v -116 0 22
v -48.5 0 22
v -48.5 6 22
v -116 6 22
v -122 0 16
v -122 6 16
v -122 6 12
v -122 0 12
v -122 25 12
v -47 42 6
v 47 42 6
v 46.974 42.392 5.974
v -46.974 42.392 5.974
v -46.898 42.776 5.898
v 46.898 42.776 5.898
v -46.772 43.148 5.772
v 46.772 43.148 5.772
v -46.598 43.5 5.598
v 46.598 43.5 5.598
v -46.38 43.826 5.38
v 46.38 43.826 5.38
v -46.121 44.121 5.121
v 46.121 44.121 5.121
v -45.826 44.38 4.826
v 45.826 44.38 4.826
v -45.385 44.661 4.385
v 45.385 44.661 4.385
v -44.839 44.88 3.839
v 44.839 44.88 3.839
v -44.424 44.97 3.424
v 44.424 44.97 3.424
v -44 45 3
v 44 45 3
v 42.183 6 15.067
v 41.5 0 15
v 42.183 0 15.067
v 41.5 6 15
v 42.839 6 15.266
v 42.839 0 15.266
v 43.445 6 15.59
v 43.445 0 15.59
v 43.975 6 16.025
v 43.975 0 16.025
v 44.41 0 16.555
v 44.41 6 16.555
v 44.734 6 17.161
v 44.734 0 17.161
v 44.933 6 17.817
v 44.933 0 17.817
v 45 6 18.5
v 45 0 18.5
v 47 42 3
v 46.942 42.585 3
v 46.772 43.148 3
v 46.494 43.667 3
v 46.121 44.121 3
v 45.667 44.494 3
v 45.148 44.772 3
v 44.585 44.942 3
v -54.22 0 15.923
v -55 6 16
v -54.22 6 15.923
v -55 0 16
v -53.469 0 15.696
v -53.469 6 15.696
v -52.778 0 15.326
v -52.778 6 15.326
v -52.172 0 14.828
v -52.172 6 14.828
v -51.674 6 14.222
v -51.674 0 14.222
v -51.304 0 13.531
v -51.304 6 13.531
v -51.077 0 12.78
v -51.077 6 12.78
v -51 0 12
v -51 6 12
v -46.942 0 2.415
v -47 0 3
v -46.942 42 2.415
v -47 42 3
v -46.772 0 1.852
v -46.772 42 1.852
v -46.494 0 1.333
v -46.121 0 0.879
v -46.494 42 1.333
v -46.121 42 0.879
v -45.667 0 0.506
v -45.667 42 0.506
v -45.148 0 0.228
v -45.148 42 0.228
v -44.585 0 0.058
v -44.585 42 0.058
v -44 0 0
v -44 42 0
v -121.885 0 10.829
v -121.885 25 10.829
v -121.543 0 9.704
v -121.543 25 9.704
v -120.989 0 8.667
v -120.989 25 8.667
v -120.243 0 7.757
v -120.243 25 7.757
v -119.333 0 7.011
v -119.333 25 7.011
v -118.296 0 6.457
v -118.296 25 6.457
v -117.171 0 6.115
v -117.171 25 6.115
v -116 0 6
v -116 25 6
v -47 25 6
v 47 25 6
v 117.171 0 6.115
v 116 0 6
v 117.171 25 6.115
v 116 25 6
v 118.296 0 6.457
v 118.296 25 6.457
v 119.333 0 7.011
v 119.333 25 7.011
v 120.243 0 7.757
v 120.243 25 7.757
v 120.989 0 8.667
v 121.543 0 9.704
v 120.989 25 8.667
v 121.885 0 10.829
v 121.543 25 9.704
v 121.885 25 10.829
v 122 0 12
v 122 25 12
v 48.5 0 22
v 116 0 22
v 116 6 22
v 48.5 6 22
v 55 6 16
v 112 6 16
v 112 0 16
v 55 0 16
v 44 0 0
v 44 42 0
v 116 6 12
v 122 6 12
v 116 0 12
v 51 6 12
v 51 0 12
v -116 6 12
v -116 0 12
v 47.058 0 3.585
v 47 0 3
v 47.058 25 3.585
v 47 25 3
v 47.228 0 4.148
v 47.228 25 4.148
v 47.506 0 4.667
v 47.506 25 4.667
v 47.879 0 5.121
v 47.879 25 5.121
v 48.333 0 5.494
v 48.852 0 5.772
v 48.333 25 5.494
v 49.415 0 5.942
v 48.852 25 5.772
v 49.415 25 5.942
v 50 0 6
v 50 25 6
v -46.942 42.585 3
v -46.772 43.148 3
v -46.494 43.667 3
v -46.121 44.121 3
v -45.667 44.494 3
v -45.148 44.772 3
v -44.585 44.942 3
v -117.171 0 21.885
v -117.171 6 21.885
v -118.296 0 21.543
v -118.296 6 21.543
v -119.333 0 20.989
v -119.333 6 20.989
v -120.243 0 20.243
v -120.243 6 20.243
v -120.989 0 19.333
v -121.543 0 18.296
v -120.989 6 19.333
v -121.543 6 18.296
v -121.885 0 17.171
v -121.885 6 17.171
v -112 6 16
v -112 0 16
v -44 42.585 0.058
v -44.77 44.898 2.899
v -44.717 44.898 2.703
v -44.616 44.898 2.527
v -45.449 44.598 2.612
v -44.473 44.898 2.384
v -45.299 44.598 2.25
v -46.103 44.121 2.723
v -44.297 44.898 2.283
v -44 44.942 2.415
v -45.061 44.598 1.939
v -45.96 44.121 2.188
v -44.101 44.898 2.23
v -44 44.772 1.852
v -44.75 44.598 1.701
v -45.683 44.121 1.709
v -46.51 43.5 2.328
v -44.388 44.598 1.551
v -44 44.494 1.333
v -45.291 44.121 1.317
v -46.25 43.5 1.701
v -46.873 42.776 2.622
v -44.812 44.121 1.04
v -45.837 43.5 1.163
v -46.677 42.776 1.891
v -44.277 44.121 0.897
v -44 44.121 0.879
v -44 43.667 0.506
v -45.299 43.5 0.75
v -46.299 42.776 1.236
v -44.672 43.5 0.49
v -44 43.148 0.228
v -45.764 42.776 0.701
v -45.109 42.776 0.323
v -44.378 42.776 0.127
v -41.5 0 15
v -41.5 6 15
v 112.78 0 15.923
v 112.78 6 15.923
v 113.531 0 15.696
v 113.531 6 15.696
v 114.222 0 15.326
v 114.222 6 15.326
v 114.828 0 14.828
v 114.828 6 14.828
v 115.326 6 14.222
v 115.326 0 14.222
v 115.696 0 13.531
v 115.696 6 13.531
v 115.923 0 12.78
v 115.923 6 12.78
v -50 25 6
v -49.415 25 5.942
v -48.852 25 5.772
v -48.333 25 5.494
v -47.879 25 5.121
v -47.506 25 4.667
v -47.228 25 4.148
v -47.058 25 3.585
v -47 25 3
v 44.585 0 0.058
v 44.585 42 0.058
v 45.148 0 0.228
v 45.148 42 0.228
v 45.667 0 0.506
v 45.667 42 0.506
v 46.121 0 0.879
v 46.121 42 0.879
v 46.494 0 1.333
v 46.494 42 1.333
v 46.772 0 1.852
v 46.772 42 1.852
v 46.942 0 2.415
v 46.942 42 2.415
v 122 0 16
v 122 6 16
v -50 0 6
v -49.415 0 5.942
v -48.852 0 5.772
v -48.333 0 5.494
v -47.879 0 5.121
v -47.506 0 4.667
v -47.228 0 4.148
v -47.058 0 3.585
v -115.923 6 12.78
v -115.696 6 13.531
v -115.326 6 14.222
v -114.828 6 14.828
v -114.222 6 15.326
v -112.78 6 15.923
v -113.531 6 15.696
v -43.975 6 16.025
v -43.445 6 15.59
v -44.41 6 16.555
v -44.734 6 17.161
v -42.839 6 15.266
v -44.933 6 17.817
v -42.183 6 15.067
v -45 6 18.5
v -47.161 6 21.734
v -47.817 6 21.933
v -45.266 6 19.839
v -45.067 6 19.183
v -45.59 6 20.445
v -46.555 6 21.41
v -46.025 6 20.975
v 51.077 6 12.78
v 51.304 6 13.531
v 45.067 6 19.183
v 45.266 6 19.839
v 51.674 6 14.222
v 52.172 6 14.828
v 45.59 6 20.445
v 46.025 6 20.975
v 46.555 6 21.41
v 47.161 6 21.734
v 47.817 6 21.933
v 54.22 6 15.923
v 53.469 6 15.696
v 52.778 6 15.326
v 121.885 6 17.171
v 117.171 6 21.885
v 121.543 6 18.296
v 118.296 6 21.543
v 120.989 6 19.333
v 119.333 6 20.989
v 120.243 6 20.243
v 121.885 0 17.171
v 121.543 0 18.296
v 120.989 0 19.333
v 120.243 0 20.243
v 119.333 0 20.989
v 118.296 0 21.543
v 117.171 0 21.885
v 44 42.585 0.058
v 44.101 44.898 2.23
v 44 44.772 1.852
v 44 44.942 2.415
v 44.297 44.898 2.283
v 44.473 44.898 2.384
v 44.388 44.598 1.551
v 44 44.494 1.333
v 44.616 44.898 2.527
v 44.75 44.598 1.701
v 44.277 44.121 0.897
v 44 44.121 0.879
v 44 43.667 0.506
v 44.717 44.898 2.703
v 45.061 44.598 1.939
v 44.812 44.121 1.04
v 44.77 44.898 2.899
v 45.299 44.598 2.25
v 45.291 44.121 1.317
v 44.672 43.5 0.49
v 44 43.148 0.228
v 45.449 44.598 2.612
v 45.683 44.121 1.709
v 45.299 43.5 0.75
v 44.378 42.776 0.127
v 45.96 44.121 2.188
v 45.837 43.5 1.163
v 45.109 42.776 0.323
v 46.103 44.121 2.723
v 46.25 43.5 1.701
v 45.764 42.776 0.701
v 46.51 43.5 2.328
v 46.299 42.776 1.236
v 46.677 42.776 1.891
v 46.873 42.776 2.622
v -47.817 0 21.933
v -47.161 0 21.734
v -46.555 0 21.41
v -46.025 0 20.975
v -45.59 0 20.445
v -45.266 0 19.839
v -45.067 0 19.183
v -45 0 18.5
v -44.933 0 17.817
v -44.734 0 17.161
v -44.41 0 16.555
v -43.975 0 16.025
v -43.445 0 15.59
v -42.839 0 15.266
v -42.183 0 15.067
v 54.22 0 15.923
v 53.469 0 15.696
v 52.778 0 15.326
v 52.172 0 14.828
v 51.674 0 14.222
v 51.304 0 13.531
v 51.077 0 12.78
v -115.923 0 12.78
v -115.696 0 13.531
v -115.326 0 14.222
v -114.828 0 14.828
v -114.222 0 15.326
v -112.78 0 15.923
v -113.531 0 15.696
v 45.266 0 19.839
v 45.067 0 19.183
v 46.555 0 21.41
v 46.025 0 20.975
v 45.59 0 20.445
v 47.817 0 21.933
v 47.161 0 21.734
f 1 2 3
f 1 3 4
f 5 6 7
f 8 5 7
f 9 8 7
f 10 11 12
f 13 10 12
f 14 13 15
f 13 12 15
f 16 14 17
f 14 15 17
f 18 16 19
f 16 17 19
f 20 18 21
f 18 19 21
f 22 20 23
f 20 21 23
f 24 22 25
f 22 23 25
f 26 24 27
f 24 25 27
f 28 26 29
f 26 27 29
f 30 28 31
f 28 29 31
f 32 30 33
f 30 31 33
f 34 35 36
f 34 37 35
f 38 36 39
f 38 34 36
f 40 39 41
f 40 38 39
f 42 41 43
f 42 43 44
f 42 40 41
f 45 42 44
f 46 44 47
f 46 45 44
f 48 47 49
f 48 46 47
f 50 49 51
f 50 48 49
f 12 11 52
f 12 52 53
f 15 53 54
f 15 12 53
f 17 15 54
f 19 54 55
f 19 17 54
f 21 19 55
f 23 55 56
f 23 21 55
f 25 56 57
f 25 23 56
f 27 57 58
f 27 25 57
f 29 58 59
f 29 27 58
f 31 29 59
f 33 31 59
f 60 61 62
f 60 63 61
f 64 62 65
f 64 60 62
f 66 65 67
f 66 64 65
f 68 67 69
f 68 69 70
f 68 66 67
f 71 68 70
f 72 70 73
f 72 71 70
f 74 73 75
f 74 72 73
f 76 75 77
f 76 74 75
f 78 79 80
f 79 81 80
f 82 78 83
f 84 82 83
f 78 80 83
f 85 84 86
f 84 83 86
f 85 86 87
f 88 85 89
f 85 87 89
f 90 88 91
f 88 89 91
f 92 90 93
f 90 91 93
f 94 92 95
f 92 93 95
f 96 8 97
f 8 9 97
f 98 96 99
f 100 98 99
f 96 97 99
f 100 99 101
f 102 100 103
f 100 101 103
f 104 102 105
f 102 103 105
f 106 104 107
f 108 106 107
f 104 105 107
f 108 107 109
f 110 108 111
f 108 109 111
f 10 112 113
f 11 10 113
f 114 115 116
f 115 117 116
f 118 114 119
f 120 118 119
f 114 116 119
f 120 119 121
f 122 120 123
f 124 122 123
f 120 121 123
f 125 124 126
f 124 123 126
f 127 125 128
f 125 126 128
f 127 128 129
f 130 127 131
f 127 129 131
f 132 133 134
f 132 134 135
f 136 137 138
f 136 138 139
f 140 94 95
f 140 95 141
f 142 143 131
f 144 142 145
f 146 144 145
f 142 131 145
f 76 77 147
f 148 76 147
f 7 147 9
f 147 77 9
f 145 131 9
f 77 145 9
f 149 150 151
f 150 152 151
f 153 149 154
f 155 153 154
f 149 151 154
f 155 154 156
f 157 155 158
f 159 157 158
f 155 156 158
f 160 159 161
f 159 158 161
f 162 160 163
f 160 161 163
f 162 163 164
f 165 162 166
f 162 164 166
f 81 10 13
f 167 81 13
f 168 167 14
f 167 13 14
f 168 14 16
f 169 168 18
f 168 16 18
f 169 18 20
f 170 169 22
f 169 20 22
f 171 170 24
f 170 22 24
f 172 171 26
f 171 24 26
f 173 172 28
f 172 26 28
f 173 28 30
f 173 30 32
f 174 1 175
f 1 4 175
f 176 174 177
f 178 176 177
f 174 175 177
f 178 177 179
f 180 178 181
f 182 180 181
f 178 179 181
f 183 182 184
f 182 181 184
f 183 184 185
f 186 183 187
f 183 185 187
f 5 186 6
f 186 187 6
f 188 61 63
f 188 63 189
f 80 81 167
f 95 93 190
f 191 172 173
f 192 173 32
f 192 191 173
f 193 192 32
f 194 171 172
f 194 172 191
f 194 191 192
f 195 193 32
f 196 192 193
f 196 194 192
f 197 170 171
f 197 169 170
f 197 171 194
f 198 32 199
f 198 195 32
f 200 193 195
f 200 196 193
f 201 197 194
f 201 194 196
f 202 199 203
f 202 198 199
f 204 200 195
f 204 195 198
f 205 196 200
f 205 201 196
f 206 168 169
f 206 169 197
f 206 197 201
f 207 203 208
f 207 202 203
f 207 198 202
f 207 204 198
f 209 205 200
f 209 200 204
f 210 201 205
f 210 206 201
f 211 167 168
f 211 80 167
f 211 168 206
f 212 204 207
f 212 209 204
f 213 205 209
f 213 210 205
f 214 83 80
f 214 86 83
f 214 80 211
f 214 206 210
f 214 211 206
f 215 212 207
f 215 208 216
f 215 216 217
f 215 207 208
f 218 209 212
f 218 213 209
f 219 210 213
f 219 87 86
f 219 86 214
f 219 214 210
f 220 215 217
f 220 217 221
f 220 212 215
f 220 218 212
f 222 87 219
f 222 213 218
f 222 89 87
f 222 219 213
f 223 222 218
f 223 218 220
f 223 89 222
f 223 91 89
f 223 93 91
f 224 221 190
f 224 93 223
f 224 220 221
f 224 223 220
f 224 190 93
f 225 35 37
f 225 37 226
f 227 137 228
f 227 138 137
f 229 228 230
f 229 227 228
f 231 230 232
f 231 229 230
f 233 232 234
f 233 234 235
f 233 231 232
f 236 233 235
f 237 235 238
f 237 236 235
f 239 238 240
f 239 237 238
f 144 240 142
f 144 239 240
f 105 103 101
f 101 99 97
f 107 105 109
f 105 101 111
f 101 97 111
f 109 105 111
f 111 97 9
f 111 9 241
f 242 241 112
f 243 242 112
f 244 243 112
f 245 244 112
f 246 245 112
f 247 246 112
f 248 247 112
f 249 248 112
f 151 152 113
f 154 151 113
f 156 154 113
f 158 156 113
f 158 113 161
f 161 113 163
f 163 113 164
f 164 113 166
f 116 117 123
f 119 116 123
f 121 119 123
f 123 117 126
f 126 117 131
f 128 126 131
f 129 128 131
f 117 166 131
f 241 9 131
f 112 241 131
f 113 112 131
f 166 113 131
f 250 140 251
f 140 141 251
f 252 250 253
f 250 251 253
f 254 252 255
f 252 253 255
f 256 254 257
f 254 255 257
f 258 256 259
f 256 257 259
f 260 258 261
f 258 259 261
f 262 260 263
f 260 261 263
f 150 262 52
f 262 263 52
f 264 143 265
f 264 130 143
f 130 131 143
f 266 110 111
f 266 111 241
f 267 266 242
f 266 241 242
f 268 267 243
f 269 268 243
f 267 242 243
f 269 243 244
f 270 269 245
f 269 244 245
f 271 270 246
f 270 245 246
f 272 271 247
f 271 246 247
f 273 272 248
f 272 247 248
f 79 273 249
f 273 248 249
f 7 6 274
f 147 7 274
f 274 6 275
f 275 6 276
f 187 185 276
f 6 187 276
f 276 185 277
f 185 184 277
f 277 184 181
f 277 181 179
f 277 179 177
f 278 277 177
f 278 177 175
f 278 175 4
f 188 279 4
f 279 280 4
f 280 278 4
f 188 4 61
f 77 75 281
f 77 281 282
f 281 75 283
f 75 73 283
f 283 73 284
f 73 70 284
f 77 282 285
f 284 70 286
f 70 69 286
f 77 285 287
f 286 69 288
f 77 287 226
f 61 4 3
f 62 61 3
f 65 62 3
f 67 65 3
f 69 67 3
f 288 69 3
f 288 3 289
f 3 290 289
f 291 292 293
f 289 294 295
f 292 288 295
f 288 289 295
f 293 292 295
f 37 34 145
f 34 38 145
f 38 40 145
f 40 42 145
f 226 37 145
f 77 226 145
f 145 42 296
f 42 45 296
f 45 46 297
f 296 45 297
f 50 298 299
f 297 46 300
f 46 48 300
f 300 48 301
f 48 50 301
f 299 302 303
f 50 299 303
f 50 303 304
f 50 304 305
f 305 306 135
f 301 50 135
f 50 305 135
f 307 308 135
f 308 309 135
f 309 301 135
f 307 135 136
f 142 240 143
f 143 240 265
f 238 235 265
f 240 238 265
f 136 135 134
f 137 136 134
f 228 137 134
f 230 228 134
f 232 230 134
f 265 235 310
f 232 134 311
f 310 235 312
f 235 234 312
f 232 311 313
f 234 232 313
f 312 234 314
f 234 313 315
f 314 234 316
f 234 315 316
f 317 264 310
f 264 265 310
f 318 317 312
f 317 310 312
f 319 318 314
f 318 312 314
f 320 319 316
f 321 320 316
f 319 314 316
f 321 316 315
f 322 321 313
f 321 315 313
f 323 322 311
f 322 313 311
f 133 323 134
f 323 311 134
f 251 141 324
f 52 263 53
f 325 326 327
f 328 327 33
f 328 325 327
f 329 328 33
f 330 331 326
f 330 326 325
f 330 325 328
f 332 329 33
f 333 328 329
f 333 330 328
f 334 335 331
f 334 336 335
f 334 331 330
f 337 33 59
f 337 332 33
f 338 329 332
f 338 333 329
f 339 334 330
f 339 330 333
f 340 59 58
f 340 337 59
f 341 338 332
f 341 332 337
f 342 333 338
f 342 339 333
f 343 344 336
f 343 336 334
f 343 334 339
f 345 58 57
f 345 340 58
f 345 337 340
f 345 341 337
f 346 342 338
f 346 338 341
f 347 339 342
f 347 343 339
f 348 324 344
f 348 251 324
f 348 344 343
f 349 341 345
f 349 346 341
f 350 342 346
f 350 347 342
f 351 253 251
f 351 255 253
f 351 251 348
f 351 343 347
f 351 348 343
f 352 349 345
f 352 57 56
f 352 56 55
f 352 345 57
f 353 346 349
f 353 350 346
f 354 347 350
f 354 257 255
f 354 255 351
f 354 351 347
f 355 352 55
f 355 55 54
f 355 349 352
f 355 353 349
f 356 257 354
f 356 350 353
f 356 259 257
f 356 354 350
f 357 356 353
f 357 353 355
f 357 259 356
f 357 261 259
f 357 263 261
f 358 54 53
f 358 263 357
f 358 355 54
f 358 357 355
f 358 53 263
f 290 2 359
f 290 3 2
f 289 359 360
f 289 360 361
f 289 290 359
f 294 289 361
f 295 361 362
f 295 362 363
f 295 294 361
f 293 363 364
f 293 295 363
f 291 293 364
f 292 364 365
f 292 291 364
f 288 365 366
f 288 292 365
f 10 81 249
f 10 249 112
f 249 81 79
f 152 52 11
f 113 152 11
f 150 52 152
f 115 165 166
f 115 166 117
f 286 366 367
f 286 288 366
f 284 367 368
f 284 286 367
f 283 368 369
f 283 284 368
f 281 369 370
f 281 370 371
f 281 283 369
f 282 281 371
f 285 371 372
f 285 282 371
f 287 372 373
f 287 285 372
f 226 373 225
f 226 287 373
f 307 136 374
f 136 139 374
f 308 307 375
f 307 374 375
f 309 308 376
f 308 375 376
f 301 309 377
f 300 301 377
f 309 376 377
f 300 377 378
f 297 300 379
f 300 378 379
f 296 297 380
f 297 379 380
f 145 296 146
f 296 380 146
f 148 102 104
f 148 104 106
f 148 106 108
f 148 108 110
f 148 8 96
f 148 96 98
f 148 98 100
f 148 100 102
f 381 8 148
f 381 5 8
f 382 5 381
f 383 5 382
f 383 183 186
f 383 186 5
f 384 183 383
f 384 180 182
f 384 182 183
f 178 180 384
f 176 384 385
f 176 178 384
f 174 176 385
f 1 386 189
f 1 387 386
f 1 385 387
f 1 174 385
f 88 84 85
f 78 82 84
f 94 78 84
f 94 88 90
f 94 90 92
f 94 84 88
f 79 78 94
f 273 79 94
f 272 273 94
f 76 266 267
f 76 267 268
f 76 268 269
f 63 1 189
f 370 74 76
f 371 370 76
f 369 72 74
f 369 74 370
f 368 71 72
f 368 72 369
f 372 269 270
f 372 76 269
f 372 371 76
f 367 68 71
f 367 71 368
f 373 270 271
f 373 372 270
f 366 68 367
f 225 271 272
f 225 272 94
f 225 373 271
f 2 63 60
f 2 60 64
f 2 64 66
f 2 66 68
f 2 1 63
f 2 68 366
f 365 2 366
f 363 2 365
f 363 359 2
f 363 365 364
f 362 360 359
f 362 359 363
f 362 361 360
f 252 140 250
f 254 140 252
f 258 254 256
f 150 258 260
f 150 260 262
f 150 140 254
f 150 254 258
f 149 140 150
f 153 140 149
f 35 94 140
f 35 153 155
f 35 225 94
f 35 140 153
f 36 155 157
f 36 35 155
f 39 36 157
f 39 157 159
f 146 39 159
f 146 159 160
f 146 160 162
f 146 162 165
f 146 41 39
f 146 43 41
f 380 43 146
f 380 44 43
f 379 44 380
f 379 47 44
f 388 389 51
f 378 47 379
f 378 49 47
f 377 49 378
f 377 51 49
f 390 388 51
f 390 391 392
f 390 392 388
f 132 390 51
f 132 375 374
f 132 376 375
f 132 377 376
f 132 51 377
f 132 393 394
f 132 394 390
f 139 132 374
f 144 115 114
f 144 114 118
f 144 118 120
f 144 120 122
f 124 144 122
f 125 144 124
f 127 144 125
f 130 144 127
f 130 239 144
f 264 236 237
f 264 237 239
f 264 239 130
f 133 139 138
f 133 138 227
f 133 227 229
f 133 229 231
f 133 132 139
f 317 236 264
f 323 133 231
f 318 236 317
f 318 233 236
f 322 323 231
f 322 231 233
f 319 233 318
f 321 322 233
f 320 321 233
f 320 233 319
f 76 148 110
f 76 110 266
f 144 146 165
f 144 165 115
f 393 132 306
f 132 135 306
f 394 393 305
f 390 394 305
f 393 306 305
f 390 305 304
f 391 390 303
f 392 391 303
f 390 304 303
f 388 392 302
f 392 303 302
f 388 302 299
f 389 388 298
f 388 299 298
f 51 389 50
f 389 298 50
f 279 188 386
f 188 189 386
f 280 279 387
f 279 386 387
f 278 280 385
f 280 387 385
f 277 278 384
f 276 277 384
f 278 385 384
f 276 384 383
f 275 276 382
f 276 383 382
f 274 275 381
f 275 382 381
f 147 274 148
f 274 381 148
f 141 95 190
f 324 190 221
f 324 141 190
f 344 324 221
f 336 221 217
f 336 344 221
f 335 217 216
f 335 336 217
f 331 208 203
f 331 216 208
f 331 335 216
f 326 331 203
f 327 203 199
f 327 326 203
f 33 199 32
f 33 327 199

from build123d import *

# Parameters (mm, degrees)
F1_DEPTH = 6
F2_DEPTH = 25
F0_W     = 94
F0_H     = 6
F3_DEPTH = 45
F4_W     = 65
F4_H     = 4
F5_DEPTH = 25
F6_R     = 3.99999
F7_R     = 3.49999
F8_R     = 5.99999
F9_R     = 2.99999


# Not quite as in the source:
# - two fillets or chamfers of one size are made in one step
# - a fillet or chamfer is up to 0.001 mm smaller than in the source, because OpenCascade refuses the exact size


with BuildPart() as f1:
    # F0 (on Front) → F1 (new body)
    with BuildSketch(Plane.XZ):
        Polygon((-122, 22), (-122, 12), (122, 12), (122, 22), (45, 22), (45, 15), (-45, 15), (-45, 22), align=None)
    extrude(amount=-F1_DEPTH)

    # F0 (on Front) → F2 (join)
    with BuildSketch(Plane.XZ):
        Polygon((-122, 12), (-122, 6), (-47, 6), (47, 6), (122, 6), (122, 12), align=None)
    extrude(amount=-F2_DEPTH)

    # F0 (on Front) → F3 (join, through all)
    with BuildSketch(Plane.XZ):
        with Locations((0, 3)):
            Rectangle(F0_W, F0_H)
    extrude(amount=-F3_DEPTH)

    # F4 (on face) → F5 (cut)
    with BuildSketch(Plane(origin=(0, 6, 0), x_dir=(-1, 0, 0), z_dir=(0, 1, 0))):
        with Locations((83.5, 14)):
            Rectangle(F4_W, F4_H)
        with Locations((-83.5, 14)):
            Rectangle(F4_W, F4_H)
    extrude(amount=-F5_DEPTH, mode=Mode.SUBTRACT)

    # F6 (radius 4 in the source; OpenCascade refuses exactly that, so slightly less here)
    f6_edges = [f1.edges().sort_by_distance(p)[0] for p in [
        (-51, 3, 16),
        (-116, 3, 16),
        (51, 3, 16),
        (116, 3, 16),
    ]]
    fillet(f6_edges, radius=F6_R)

    # F7 (radius 3.5 in the source; OpenCascade refuses exactly that, so slightly less here)
    f7_edges = [f1.edges().sort_by_distance(p)[0] for p in [
        (-45, 3, 15),
        (-45, 3, 22),
        (45, 3, 15),
        (45, 3, 22),
    ]]
    fillet(f7_edges, radius=F7_R)

    # F8 (radius 6 in the source; OpenCascade refuses exactly that, so slightly less here)
    f8_edges = [f1.edges().sort_by_distance(p)[0] for p in [
        (-122, 3, 22),
        (122, 3, 22),
        (-122, 12.5, 6),
        (122, 12.5, 6),
    ]]
    fillet(f8_edges, radius=F8_R)

    # F9 (radius 3 in the source; OpenCascade refuses exactly that, so slightly less here)
    f9_edges = [f1.edges().sort_by_distance(p)[0] for p in [
        (47, 12.5, 6),
        (47, 22.5, 0),
        (-47, 22.5, 0),
        (-47, 12.5, 6),
        (-47, 45, 3),
        (0, 45, 0),
        (47, 45, 3),
        (0, 45, 6),
    ]]
    fillet(f9_edges, radius=F9_R)


solid = f1.part
